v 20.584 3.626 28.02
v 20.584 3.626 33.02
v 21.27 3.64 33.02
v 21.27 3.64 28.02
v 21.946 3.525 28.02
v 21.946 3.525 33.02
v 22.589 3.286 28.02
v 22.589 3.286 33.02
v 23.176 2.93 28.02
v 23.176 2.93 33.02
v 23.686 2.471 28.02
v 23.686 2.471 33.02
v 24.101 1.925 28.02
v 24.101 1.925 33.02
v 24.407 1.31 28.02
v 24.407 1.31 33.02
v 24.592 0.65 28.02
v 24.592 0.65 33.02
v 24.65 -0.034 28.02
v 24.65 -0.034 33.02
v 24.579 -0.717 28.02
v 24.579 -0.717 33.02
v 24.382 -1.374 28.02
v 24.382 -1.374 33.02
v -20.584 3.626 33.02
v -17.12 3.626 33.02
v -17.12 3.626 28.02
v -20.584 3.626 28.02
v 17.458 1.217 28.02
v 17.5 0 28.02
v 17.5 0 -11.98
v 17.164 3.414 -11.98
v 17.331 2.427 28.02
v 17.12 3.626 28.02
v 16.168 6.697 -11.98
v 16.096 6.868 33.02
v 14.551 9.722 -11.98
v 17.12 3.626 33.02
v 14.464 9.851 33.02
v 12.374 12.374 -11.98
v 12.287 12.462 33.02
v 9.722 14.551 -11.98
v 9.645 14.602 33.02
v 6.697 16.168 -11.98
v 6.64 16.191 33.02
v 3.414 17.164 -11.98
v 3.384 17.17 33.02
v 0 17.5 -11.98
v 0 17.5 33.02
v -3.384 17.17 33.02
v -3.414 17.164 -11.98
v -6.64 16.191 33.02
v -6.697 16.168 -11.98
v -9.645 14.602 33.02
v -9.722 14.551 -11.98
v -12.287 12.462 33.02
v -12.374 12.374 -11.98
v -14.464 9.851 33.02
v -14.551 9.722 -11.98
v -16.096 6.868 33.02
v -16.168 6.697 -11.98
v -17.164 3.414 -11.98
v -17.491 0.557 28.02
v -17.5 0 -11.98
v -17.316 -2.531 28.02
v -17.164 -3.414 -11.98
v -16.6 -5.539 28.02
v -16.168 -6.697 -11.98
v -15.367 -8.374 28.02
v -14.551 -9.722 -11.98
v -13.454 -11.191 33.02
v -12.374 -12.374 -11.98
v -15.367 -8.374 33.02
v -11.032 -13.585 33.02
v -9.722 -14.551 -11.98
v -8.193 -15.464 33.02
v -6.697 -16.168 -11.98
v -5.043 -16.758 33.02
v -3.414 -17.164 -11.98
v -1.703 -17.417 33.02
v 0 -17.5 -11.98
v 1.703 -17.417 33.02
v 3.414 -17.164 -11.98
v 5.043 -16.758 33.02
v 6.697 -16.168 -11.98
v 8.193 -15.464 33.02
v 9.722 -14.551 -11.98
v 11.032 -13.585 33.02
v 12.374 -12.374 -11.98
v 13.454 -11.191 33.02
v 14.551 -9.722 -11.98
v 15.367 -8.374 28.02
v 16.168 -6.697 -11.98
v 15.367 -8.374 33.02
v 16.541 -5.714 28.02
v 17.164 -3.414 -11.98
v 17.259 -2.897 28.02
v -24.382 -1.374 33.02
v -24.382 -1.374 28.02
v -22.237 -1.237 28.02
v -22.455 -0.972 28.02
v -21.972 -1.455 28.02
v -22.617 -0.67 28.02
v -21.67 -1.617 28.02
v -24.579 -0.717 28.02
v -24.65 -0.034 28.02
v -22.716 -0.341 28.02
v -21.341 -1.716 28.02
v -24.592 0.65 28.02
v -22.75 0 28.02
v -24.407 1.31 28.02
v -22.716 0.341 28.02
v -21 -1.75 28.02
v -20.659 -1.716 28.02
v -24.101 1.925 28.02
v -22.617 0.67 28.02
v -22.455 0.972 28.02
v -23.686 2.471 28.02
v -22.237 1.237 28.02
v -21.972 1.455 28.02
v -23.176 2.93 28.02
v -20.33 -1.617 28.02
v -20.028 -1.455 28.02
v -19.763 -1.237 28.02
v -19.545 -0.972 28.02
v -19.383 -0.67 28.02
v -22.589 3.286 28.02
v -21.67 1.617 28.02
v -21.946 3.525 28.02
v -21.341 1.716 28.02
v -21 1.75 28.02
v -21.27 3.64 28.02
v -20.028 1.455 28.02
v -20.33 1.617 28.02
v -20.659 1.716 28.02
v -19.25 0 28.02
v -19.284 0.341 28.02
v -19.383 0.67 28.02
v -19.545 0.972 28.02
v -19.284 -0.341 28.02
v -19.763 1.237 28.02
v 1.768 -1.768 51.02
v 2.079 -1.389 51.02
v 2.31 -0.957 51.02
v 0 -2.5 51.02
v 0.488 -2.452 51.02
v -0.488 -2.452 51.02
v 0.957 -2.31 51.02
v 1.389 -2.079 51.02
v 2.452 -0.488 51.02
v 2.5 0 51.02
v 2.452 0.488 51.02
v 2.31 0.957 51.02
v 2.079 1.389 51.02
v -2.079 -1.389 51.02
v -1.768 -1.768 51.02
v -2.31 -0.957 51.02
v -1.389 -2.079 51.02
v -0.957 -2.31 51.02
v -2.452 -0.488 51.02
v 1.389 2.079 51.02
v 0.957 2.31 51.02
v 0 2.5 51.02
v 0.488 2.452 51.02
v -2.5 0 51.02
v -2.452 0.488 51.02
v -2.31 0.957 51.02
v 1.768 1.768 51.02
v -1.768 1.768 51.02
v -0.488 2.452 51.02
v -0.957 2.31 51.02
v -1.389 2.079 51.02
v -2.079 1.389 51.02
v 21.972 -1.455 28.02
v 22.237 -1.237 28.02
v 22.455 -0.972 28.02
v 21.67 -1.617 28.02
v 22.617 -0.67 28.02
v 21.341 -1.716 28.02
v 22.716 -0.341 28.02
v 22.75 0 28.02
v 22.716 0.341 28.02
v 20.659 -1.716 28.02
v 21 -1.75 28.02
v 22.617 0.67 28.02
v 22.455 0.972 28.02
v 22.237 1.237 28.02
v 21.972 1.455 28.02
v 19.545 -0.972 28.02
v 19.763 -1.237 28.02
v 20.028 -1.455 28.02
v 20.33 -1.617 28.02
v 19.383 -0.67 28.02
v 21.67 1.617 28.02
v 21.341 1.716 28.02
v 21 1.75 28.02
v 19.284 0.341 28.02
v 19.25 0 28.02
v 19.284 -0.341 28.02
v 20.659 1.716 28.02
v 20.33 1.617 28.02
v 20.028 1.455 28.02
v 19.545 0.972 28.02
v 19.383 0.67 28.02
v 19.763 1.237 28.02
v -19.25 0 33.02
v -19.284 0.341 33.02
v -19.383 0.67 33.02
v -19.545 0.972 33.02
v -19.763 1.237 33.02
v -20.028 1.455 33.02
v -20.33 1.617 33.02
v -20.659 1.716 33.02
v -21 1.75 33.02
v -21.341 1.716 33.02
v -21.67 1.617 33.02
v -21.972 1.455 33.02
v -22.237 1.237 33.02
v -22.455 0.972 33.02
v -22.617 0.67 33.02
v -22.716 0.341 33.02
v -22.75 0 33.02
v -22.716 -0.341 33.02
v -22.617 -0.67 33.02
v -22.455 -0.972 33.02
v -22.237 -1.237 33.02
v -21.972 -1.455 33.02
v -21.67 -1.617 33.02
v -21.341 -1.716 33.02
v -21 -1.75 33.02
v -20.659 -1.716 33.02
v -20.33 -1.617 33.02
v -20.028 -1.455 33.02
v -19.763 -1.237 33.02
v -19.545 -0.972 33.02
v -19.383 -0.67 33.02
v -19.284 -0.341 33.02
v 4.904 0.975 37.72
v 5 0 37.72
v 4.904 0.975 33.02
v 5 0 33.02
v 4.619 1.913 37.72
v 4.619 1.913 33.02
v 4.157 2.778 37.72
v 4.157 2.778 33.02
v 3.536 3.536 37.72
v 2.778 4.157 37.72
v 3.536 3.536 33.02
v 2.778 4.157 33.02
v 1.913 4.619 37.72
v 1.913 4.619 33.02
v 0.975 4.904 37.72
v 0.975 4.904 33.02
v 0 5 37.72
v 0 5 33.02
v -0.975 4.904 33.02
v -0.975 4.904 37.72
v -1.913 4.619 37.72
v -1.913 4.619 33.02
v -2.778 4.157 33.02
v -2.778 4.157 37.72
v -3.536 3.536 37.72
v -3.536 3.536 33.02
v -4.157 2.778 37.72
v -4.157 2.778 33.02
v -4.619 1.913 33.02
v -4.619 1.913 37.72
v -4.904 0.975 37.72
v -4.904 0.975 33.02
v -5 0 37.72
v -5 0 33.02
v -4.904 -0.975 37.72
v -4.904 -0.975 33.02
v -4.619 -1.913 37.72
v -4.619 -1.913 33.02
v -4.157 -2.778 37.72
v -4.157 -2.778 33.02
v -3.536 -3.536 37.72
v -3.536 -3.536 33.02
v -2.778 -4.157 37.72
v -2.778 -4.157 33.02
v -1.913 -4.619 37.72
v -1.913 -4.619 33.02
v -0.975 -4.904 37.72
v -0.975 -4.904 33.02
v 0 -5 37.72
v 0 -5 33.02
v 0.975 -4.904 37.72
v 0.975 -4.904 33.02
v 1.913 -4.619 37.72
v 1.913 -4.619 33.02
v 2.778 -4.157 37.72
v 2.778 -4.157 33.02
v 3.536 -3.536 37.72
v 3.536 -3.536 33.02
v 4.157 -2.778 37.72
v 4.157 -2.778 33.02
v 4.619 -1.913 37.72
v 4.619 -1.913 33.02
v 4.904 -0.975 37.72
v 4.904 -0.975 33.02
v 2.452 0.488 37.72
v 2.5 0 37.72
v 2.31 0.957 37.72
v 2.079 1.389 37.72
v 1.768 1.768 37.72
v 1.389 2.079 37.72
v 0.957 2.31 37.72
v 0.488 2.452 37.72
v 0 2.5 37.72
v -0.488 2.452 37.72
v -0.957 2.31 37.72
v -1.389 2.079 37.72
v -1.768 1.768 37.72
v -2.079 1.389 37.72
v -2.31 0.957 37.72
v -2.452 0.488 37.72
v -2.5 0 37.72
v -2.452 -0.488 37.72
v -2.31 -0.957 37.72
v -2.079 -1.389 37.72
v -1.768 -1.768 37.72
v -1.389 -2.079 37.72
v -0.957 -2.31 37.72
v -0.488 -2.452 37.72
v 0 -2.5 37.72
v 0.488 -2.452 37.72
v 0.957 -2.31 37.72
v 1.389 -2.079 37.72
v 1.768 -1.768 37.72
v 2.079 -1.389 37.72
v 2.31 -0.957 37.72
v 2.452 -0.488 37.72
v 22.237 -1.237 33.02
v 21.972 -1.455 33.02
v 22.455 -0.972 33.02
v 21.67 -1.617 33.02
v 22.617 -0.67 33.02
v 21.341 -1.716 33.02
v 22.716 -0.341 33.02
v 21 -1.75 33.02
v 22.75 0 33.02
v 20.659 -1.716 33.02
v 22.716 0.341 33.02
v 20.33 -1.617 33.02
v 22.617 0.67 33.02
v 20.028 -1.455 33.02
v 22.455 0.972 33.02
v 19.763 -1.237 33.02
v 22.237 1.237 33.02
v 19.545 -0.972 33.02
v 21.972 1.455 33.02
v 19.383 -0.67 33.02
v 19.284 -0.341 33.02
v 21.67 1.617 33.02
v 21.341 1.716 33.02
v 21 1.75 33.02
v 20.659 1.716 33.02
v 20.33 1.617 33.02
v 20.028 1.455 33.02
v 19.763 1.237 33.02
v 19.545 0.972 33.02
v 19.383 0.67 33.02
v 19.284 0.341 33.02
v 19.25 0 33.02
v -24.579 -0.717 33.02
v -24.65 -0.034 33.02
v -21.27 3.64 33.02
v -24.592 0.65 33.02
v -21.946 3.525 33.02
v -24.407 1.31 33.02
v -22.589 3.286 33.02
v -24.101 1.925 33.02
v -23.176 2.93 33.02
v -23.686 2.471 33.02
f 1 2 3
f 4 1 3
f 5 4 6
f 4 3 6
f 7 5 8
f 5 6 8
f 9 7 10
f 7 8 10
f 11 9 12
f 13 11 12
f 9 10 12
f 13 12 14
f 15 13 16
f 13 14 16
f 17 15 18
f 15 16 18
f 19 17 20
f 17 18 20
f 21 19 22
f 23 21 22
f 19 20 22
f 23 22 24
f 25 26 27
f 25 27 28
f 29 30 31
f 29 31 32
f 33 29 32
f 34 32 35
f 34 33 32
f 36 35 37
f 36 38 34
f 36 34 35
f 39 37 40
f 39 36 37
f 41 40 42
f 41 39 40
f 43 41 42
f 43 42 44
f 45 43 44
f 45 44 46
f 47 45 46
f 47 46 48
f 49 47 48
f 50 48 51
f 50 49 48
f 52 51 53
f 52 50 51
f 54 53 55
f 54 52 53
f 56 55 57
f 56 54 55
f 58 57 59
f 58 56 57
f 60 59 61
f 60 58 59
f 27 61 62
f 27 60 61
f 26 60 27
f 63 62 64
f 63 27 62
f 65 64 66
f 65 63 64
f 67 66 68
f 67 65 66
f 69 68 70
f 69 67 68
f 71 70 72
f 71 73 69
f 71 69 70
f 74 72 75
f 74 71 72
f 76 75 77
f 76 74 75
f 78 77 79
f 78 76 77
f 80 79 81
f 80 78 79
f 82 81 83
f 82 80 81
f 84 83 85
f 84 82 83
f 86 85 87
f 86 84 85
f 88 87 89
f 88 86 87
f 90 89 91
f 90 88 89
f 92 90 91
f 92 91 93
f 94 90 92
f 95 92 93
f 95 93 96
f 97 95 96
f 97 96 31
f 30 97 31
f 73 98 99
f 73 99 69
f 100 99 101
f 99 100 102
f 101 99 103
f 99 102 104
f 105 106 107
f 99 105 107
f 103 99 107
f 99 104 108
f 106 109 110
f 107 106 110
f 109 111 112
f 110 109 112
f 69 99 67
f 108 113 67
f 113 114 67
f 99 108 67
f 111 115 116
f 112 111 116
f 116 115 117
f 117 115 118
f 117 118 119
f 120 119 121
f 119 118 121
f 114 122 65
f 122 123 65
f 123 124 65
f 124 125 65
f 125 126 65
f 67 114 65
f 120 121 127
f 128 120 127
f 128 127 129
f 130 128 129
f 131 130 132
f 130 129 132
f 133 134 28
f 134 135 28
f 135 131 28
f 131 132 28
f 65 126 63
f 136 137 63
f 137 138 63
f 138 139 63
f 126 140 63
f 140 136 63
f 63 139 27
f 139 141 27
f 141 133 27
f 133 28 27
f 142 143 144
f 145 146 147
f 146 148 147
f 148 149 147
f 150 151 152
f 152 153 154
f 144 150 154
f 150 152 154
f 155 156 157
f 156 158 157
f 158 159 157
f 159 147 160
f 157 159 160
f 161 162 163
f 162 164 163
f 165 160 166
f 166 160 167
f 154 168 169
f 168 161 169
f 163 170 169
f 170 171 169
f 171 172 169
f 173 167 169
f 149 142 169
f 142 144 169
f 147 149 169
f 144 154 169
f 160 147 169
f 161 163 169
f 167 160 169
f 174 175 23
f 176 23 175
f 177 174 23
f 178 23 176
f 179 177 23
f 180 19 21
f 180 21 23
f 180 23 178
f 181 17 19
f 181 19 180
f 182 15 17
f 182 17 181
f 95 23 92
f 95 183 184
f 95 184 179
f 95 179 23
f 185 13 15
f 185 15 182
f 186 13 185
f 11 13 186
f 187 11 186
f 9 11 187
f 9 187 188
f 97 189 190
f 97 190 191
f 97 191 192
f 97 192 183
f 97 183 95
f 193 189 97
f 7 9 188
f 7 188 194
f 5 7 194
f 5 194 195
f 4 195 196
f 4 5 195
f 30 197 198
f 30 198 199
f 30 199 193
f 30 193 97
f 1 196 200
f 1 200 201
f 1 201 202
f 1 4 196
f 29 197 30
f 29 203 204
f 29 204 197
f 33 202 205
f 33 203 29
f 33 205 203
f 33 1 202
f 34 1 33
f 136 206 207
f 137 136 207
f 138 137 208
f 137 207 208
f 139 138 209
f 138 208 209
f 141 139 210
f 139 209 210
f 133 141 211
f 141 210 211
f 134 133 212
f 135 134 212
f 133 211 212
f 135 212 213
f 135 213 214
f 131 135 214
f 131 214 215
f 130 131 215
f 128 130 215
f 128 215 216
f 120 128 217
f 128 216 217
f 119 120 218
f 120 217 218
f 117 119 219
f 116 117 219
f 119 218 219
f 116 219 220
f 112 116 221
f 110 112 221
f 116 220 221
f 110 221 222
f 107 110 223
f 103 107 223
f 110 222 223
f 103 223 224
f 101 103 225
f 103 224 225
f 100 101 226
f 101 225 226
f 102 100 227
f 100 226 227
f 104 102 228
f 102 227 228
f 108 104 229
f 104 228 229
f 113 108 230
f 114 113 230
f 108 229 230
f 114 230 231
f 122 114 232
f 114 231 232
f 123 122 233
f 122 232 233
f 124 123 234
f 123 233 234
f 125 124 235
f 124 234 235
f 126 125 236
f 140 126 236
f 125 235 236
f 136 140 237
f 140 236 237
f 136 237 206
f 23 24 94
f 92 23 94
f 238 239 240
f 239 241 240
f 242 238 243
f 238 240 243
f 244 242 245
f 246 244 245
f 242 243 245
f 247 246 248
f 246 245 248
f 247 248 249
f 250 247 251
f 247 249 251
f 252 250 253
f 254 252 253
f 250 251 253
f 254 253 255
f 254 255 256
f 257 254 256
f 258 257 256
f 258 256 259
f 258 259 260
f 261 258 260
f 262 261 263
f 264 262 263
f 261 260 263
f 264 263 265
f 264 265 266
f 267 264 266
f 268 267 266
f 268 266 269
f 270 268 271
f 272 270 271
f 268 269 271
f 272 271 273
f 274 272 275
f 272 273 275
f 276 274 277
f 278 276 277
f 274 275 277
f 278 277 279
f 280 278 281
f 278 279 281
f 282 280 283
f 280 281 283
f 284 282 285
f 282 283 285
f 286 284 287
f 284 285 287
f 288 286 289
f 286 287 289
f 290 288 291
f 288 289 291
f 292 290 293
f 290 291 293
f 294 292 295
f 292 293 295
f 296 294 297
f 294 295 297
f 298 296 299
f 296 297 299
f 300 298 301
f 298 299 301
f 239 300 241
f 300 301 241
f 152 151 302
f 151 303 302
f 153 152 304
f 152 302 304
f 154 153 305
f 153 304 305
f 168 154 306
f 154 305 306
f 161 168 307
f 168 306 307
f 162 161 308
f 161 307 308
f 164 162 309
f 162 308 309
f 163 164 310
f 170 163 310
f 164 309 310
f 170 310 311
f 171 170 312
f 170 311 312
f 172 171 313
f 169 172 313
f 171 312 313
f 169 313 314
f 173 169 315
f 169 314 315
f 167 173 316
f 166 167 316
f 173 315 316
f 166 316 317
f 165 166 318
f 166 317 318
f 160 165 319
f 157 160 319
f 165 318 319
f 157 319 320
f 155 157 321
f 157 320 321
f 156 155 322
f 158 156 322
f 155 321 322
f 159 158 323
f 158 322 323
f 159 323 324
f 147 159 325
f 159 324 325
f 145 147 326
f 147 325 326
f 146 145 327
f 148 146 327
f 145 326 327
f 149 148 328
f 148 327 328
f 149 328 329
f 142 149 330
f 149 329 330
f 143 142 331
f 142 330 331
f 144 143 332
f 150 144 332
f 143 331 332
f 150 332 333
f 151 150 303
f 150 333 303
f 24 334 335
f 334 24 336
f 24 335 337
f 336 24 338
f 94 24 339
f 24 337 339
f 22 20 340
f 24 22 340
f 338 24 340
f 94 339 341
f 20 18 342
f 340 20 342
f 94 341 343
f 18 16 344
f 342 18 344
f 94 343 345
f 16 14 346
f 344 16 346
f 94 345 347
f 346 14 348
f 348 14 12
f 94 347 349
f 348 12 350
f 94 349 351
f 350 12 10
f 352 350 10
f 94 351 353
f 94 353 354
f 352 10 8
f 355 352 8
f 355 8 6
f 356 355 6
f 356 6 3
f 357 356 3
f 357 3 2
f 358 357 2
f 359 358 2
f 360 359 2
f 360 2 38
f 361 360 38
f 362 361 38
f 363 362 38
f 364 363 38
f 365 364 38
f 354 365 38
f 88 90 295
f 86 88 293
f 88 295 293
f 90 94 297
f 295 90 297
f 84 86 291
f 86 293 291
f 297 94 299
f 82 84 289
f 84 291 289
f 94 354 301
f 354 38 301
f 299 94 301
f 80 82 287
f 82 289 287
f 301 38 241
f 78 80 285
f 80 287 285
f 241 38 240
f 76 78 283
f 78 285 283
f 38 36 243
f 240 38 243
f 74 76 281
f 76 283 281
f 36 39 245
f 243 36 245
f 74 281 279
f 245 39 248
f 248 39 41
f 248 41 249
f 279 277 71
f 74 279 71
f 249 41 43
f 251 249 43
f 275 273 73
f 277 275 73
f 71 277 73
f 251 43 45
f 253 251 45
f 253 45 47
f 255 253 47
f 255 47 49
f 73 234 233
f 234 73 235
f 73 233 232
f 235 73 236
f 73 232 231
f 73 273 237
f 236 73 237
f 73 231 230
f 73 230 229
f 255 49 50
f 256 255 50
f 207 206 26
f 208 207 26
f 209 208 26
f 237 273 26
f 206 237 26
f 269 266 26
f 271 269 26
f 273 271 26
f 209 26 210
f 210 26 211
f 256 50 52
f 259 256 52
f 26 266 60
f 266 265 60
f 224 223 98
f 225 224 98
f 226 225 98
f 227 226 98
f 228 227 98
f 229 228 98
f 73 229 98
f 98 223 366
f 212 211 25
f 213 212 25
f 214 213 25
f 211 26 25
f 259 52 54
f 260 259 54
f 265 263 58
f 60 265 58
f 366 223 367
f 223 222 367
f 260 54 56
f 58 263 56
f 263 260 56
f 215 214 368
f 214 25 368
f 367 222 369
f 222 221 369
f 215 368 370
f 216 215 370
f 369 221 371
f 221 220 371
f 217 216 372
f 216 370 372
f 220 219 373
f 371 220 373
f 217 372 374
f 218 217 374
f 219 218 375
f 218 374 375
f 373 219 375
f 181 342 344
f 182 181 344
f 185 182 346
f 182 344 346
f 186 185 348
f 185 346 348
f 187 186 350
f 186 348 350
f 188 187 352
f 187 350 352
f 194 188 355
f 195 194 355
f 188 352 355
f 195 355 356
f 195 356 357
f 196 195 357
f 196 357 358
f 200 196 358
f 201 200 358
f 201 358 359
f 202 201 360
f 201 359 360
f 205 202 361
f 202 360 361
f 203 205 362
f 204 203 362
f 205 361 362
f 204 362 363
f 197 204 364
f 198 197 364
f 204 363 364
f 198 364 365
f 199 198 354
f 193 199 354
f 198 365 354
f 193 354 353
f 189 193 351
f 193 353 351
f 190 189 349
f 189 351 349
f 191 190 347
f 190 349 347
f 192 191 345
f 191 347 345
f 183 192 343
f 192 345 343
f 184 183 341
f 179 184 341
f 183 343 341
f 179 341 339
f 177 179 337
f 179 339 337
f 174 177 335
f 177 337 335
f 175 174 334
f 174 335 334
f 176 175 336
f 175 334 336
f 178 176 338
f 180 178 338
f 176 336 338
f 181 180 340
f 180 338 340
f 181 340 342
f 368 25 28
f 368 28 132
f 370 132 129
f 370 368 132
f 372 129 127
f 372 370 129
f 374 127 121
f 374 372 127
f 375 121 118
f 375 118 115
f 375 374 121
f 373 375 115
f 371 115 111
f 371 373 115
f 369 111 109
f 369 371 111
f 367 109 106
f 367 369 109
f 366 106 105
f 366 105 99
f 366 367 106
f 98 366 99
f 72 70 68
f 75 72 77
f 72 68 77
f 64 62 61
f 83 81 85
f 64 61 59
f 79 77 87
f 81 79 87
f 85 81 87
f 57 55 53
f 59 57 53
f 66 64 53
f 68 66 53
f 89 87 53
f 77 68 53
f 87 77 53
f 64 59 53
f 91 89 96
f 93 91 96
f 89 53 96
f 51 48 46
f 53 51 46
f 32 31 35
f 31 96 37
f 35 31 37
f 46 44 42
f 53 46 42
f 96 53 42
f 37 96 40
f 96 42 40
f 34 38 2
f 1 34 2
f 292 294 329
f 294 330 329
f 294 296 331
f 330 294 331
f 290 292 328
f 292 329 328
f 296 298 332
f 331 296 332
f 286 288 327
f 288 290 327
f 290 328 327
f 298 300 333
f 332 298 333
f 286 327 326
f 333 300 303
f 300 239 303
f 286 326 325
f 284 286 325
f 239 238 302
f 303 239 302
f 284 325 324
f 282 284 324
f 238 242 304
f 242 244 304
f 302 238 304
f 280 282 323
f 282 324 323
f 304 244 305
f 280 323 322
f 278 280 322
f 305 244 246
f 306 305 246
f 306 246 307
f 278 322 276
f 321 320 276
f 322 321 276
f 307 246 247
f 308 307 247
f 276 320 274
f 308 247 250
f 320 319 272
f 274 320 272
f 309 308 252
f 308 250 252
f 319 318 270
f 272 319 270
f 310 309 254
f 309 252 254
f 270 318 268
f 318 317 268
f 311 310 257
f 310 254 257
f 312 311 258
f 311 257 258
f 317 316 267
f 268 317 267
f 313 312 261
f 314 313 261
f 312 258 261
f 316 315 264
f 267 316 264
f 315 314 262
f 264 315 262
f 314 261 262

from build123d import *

# Parameters (mm, degrees)
SKETCH1_R           = 17.5
BOSS_EXTRUDE1_DEPTH = 45
SKETCH7_R           = 1.75
BOSS_EXTRUDE2_DEPTH = 5


with BuildPart() as part:
    # Sketch1 → Boss-Extrude1 (new body)
    with BuildSketch(Plane.XY.offset(33.02)):
        Circle(SKETCH1_R)
    extrude(amount=-BOSS_EXTRUDE1_DEPTH)

    # Sketch6 → Revolve5 (revolve)
    with BuildSketch(Plane(origin=(0, 0, 0), x_dir=(1, 0, 0), z_dir=(0, 1, 0))):
        Polygon((5, -33.02), (0, -33.02), (0, -51.02), (2.5, -51.02), (2.5, -37.72), (5, -37.72), align=None)
    revolve(axis=Axis((0, 0, 33.02), (0, 0, 1)))

    # Sketch7 → Boss-Extrude2 (add)
    with BuildSketch(Plane.XY.offset(33.02)):
        with BuildLine():
            Line((17.12018182, 3.626206621), (20.583916427, 3.626206621))
            ThreePointArc((20.583916427, 3.626206621), (23.906641712, 2.207698792), (24.381596036, -1.373793379))
            Line((24.381596036, -1.373793379), (15.366508532, -8.373793379))
            Line((15.366508532, -8.373793379), (17.12018182, 3.626206621))
        make_face()
        with Locations((21, 0)):
            Circle(SKETCH7_R, mode=Mode.SUBTRACT)
        with BuildLine():
            Line((-17.12018182, 3.626206621), (-20.583916427, 3.626206621))
            ThreePointArc((-20.583916427, 3.626206621), (-23.906641712, 2.207698792), (-24.381596036, -1.373793379))
            Line((-24.381596036, -1.373793379), (-15.366508532, -8.373793379))
            Line((-15.366508532, -8.373793379), (-17.12018182, 3.626206621))
        make_face()
        with Locations((-21, 0)):
            Circle(SKETCH7_R, mode=Mode.SUBTRACT)
    extrude(amount=-BOSS_EXTRUDE2_DEPTH)


solid = part.part
